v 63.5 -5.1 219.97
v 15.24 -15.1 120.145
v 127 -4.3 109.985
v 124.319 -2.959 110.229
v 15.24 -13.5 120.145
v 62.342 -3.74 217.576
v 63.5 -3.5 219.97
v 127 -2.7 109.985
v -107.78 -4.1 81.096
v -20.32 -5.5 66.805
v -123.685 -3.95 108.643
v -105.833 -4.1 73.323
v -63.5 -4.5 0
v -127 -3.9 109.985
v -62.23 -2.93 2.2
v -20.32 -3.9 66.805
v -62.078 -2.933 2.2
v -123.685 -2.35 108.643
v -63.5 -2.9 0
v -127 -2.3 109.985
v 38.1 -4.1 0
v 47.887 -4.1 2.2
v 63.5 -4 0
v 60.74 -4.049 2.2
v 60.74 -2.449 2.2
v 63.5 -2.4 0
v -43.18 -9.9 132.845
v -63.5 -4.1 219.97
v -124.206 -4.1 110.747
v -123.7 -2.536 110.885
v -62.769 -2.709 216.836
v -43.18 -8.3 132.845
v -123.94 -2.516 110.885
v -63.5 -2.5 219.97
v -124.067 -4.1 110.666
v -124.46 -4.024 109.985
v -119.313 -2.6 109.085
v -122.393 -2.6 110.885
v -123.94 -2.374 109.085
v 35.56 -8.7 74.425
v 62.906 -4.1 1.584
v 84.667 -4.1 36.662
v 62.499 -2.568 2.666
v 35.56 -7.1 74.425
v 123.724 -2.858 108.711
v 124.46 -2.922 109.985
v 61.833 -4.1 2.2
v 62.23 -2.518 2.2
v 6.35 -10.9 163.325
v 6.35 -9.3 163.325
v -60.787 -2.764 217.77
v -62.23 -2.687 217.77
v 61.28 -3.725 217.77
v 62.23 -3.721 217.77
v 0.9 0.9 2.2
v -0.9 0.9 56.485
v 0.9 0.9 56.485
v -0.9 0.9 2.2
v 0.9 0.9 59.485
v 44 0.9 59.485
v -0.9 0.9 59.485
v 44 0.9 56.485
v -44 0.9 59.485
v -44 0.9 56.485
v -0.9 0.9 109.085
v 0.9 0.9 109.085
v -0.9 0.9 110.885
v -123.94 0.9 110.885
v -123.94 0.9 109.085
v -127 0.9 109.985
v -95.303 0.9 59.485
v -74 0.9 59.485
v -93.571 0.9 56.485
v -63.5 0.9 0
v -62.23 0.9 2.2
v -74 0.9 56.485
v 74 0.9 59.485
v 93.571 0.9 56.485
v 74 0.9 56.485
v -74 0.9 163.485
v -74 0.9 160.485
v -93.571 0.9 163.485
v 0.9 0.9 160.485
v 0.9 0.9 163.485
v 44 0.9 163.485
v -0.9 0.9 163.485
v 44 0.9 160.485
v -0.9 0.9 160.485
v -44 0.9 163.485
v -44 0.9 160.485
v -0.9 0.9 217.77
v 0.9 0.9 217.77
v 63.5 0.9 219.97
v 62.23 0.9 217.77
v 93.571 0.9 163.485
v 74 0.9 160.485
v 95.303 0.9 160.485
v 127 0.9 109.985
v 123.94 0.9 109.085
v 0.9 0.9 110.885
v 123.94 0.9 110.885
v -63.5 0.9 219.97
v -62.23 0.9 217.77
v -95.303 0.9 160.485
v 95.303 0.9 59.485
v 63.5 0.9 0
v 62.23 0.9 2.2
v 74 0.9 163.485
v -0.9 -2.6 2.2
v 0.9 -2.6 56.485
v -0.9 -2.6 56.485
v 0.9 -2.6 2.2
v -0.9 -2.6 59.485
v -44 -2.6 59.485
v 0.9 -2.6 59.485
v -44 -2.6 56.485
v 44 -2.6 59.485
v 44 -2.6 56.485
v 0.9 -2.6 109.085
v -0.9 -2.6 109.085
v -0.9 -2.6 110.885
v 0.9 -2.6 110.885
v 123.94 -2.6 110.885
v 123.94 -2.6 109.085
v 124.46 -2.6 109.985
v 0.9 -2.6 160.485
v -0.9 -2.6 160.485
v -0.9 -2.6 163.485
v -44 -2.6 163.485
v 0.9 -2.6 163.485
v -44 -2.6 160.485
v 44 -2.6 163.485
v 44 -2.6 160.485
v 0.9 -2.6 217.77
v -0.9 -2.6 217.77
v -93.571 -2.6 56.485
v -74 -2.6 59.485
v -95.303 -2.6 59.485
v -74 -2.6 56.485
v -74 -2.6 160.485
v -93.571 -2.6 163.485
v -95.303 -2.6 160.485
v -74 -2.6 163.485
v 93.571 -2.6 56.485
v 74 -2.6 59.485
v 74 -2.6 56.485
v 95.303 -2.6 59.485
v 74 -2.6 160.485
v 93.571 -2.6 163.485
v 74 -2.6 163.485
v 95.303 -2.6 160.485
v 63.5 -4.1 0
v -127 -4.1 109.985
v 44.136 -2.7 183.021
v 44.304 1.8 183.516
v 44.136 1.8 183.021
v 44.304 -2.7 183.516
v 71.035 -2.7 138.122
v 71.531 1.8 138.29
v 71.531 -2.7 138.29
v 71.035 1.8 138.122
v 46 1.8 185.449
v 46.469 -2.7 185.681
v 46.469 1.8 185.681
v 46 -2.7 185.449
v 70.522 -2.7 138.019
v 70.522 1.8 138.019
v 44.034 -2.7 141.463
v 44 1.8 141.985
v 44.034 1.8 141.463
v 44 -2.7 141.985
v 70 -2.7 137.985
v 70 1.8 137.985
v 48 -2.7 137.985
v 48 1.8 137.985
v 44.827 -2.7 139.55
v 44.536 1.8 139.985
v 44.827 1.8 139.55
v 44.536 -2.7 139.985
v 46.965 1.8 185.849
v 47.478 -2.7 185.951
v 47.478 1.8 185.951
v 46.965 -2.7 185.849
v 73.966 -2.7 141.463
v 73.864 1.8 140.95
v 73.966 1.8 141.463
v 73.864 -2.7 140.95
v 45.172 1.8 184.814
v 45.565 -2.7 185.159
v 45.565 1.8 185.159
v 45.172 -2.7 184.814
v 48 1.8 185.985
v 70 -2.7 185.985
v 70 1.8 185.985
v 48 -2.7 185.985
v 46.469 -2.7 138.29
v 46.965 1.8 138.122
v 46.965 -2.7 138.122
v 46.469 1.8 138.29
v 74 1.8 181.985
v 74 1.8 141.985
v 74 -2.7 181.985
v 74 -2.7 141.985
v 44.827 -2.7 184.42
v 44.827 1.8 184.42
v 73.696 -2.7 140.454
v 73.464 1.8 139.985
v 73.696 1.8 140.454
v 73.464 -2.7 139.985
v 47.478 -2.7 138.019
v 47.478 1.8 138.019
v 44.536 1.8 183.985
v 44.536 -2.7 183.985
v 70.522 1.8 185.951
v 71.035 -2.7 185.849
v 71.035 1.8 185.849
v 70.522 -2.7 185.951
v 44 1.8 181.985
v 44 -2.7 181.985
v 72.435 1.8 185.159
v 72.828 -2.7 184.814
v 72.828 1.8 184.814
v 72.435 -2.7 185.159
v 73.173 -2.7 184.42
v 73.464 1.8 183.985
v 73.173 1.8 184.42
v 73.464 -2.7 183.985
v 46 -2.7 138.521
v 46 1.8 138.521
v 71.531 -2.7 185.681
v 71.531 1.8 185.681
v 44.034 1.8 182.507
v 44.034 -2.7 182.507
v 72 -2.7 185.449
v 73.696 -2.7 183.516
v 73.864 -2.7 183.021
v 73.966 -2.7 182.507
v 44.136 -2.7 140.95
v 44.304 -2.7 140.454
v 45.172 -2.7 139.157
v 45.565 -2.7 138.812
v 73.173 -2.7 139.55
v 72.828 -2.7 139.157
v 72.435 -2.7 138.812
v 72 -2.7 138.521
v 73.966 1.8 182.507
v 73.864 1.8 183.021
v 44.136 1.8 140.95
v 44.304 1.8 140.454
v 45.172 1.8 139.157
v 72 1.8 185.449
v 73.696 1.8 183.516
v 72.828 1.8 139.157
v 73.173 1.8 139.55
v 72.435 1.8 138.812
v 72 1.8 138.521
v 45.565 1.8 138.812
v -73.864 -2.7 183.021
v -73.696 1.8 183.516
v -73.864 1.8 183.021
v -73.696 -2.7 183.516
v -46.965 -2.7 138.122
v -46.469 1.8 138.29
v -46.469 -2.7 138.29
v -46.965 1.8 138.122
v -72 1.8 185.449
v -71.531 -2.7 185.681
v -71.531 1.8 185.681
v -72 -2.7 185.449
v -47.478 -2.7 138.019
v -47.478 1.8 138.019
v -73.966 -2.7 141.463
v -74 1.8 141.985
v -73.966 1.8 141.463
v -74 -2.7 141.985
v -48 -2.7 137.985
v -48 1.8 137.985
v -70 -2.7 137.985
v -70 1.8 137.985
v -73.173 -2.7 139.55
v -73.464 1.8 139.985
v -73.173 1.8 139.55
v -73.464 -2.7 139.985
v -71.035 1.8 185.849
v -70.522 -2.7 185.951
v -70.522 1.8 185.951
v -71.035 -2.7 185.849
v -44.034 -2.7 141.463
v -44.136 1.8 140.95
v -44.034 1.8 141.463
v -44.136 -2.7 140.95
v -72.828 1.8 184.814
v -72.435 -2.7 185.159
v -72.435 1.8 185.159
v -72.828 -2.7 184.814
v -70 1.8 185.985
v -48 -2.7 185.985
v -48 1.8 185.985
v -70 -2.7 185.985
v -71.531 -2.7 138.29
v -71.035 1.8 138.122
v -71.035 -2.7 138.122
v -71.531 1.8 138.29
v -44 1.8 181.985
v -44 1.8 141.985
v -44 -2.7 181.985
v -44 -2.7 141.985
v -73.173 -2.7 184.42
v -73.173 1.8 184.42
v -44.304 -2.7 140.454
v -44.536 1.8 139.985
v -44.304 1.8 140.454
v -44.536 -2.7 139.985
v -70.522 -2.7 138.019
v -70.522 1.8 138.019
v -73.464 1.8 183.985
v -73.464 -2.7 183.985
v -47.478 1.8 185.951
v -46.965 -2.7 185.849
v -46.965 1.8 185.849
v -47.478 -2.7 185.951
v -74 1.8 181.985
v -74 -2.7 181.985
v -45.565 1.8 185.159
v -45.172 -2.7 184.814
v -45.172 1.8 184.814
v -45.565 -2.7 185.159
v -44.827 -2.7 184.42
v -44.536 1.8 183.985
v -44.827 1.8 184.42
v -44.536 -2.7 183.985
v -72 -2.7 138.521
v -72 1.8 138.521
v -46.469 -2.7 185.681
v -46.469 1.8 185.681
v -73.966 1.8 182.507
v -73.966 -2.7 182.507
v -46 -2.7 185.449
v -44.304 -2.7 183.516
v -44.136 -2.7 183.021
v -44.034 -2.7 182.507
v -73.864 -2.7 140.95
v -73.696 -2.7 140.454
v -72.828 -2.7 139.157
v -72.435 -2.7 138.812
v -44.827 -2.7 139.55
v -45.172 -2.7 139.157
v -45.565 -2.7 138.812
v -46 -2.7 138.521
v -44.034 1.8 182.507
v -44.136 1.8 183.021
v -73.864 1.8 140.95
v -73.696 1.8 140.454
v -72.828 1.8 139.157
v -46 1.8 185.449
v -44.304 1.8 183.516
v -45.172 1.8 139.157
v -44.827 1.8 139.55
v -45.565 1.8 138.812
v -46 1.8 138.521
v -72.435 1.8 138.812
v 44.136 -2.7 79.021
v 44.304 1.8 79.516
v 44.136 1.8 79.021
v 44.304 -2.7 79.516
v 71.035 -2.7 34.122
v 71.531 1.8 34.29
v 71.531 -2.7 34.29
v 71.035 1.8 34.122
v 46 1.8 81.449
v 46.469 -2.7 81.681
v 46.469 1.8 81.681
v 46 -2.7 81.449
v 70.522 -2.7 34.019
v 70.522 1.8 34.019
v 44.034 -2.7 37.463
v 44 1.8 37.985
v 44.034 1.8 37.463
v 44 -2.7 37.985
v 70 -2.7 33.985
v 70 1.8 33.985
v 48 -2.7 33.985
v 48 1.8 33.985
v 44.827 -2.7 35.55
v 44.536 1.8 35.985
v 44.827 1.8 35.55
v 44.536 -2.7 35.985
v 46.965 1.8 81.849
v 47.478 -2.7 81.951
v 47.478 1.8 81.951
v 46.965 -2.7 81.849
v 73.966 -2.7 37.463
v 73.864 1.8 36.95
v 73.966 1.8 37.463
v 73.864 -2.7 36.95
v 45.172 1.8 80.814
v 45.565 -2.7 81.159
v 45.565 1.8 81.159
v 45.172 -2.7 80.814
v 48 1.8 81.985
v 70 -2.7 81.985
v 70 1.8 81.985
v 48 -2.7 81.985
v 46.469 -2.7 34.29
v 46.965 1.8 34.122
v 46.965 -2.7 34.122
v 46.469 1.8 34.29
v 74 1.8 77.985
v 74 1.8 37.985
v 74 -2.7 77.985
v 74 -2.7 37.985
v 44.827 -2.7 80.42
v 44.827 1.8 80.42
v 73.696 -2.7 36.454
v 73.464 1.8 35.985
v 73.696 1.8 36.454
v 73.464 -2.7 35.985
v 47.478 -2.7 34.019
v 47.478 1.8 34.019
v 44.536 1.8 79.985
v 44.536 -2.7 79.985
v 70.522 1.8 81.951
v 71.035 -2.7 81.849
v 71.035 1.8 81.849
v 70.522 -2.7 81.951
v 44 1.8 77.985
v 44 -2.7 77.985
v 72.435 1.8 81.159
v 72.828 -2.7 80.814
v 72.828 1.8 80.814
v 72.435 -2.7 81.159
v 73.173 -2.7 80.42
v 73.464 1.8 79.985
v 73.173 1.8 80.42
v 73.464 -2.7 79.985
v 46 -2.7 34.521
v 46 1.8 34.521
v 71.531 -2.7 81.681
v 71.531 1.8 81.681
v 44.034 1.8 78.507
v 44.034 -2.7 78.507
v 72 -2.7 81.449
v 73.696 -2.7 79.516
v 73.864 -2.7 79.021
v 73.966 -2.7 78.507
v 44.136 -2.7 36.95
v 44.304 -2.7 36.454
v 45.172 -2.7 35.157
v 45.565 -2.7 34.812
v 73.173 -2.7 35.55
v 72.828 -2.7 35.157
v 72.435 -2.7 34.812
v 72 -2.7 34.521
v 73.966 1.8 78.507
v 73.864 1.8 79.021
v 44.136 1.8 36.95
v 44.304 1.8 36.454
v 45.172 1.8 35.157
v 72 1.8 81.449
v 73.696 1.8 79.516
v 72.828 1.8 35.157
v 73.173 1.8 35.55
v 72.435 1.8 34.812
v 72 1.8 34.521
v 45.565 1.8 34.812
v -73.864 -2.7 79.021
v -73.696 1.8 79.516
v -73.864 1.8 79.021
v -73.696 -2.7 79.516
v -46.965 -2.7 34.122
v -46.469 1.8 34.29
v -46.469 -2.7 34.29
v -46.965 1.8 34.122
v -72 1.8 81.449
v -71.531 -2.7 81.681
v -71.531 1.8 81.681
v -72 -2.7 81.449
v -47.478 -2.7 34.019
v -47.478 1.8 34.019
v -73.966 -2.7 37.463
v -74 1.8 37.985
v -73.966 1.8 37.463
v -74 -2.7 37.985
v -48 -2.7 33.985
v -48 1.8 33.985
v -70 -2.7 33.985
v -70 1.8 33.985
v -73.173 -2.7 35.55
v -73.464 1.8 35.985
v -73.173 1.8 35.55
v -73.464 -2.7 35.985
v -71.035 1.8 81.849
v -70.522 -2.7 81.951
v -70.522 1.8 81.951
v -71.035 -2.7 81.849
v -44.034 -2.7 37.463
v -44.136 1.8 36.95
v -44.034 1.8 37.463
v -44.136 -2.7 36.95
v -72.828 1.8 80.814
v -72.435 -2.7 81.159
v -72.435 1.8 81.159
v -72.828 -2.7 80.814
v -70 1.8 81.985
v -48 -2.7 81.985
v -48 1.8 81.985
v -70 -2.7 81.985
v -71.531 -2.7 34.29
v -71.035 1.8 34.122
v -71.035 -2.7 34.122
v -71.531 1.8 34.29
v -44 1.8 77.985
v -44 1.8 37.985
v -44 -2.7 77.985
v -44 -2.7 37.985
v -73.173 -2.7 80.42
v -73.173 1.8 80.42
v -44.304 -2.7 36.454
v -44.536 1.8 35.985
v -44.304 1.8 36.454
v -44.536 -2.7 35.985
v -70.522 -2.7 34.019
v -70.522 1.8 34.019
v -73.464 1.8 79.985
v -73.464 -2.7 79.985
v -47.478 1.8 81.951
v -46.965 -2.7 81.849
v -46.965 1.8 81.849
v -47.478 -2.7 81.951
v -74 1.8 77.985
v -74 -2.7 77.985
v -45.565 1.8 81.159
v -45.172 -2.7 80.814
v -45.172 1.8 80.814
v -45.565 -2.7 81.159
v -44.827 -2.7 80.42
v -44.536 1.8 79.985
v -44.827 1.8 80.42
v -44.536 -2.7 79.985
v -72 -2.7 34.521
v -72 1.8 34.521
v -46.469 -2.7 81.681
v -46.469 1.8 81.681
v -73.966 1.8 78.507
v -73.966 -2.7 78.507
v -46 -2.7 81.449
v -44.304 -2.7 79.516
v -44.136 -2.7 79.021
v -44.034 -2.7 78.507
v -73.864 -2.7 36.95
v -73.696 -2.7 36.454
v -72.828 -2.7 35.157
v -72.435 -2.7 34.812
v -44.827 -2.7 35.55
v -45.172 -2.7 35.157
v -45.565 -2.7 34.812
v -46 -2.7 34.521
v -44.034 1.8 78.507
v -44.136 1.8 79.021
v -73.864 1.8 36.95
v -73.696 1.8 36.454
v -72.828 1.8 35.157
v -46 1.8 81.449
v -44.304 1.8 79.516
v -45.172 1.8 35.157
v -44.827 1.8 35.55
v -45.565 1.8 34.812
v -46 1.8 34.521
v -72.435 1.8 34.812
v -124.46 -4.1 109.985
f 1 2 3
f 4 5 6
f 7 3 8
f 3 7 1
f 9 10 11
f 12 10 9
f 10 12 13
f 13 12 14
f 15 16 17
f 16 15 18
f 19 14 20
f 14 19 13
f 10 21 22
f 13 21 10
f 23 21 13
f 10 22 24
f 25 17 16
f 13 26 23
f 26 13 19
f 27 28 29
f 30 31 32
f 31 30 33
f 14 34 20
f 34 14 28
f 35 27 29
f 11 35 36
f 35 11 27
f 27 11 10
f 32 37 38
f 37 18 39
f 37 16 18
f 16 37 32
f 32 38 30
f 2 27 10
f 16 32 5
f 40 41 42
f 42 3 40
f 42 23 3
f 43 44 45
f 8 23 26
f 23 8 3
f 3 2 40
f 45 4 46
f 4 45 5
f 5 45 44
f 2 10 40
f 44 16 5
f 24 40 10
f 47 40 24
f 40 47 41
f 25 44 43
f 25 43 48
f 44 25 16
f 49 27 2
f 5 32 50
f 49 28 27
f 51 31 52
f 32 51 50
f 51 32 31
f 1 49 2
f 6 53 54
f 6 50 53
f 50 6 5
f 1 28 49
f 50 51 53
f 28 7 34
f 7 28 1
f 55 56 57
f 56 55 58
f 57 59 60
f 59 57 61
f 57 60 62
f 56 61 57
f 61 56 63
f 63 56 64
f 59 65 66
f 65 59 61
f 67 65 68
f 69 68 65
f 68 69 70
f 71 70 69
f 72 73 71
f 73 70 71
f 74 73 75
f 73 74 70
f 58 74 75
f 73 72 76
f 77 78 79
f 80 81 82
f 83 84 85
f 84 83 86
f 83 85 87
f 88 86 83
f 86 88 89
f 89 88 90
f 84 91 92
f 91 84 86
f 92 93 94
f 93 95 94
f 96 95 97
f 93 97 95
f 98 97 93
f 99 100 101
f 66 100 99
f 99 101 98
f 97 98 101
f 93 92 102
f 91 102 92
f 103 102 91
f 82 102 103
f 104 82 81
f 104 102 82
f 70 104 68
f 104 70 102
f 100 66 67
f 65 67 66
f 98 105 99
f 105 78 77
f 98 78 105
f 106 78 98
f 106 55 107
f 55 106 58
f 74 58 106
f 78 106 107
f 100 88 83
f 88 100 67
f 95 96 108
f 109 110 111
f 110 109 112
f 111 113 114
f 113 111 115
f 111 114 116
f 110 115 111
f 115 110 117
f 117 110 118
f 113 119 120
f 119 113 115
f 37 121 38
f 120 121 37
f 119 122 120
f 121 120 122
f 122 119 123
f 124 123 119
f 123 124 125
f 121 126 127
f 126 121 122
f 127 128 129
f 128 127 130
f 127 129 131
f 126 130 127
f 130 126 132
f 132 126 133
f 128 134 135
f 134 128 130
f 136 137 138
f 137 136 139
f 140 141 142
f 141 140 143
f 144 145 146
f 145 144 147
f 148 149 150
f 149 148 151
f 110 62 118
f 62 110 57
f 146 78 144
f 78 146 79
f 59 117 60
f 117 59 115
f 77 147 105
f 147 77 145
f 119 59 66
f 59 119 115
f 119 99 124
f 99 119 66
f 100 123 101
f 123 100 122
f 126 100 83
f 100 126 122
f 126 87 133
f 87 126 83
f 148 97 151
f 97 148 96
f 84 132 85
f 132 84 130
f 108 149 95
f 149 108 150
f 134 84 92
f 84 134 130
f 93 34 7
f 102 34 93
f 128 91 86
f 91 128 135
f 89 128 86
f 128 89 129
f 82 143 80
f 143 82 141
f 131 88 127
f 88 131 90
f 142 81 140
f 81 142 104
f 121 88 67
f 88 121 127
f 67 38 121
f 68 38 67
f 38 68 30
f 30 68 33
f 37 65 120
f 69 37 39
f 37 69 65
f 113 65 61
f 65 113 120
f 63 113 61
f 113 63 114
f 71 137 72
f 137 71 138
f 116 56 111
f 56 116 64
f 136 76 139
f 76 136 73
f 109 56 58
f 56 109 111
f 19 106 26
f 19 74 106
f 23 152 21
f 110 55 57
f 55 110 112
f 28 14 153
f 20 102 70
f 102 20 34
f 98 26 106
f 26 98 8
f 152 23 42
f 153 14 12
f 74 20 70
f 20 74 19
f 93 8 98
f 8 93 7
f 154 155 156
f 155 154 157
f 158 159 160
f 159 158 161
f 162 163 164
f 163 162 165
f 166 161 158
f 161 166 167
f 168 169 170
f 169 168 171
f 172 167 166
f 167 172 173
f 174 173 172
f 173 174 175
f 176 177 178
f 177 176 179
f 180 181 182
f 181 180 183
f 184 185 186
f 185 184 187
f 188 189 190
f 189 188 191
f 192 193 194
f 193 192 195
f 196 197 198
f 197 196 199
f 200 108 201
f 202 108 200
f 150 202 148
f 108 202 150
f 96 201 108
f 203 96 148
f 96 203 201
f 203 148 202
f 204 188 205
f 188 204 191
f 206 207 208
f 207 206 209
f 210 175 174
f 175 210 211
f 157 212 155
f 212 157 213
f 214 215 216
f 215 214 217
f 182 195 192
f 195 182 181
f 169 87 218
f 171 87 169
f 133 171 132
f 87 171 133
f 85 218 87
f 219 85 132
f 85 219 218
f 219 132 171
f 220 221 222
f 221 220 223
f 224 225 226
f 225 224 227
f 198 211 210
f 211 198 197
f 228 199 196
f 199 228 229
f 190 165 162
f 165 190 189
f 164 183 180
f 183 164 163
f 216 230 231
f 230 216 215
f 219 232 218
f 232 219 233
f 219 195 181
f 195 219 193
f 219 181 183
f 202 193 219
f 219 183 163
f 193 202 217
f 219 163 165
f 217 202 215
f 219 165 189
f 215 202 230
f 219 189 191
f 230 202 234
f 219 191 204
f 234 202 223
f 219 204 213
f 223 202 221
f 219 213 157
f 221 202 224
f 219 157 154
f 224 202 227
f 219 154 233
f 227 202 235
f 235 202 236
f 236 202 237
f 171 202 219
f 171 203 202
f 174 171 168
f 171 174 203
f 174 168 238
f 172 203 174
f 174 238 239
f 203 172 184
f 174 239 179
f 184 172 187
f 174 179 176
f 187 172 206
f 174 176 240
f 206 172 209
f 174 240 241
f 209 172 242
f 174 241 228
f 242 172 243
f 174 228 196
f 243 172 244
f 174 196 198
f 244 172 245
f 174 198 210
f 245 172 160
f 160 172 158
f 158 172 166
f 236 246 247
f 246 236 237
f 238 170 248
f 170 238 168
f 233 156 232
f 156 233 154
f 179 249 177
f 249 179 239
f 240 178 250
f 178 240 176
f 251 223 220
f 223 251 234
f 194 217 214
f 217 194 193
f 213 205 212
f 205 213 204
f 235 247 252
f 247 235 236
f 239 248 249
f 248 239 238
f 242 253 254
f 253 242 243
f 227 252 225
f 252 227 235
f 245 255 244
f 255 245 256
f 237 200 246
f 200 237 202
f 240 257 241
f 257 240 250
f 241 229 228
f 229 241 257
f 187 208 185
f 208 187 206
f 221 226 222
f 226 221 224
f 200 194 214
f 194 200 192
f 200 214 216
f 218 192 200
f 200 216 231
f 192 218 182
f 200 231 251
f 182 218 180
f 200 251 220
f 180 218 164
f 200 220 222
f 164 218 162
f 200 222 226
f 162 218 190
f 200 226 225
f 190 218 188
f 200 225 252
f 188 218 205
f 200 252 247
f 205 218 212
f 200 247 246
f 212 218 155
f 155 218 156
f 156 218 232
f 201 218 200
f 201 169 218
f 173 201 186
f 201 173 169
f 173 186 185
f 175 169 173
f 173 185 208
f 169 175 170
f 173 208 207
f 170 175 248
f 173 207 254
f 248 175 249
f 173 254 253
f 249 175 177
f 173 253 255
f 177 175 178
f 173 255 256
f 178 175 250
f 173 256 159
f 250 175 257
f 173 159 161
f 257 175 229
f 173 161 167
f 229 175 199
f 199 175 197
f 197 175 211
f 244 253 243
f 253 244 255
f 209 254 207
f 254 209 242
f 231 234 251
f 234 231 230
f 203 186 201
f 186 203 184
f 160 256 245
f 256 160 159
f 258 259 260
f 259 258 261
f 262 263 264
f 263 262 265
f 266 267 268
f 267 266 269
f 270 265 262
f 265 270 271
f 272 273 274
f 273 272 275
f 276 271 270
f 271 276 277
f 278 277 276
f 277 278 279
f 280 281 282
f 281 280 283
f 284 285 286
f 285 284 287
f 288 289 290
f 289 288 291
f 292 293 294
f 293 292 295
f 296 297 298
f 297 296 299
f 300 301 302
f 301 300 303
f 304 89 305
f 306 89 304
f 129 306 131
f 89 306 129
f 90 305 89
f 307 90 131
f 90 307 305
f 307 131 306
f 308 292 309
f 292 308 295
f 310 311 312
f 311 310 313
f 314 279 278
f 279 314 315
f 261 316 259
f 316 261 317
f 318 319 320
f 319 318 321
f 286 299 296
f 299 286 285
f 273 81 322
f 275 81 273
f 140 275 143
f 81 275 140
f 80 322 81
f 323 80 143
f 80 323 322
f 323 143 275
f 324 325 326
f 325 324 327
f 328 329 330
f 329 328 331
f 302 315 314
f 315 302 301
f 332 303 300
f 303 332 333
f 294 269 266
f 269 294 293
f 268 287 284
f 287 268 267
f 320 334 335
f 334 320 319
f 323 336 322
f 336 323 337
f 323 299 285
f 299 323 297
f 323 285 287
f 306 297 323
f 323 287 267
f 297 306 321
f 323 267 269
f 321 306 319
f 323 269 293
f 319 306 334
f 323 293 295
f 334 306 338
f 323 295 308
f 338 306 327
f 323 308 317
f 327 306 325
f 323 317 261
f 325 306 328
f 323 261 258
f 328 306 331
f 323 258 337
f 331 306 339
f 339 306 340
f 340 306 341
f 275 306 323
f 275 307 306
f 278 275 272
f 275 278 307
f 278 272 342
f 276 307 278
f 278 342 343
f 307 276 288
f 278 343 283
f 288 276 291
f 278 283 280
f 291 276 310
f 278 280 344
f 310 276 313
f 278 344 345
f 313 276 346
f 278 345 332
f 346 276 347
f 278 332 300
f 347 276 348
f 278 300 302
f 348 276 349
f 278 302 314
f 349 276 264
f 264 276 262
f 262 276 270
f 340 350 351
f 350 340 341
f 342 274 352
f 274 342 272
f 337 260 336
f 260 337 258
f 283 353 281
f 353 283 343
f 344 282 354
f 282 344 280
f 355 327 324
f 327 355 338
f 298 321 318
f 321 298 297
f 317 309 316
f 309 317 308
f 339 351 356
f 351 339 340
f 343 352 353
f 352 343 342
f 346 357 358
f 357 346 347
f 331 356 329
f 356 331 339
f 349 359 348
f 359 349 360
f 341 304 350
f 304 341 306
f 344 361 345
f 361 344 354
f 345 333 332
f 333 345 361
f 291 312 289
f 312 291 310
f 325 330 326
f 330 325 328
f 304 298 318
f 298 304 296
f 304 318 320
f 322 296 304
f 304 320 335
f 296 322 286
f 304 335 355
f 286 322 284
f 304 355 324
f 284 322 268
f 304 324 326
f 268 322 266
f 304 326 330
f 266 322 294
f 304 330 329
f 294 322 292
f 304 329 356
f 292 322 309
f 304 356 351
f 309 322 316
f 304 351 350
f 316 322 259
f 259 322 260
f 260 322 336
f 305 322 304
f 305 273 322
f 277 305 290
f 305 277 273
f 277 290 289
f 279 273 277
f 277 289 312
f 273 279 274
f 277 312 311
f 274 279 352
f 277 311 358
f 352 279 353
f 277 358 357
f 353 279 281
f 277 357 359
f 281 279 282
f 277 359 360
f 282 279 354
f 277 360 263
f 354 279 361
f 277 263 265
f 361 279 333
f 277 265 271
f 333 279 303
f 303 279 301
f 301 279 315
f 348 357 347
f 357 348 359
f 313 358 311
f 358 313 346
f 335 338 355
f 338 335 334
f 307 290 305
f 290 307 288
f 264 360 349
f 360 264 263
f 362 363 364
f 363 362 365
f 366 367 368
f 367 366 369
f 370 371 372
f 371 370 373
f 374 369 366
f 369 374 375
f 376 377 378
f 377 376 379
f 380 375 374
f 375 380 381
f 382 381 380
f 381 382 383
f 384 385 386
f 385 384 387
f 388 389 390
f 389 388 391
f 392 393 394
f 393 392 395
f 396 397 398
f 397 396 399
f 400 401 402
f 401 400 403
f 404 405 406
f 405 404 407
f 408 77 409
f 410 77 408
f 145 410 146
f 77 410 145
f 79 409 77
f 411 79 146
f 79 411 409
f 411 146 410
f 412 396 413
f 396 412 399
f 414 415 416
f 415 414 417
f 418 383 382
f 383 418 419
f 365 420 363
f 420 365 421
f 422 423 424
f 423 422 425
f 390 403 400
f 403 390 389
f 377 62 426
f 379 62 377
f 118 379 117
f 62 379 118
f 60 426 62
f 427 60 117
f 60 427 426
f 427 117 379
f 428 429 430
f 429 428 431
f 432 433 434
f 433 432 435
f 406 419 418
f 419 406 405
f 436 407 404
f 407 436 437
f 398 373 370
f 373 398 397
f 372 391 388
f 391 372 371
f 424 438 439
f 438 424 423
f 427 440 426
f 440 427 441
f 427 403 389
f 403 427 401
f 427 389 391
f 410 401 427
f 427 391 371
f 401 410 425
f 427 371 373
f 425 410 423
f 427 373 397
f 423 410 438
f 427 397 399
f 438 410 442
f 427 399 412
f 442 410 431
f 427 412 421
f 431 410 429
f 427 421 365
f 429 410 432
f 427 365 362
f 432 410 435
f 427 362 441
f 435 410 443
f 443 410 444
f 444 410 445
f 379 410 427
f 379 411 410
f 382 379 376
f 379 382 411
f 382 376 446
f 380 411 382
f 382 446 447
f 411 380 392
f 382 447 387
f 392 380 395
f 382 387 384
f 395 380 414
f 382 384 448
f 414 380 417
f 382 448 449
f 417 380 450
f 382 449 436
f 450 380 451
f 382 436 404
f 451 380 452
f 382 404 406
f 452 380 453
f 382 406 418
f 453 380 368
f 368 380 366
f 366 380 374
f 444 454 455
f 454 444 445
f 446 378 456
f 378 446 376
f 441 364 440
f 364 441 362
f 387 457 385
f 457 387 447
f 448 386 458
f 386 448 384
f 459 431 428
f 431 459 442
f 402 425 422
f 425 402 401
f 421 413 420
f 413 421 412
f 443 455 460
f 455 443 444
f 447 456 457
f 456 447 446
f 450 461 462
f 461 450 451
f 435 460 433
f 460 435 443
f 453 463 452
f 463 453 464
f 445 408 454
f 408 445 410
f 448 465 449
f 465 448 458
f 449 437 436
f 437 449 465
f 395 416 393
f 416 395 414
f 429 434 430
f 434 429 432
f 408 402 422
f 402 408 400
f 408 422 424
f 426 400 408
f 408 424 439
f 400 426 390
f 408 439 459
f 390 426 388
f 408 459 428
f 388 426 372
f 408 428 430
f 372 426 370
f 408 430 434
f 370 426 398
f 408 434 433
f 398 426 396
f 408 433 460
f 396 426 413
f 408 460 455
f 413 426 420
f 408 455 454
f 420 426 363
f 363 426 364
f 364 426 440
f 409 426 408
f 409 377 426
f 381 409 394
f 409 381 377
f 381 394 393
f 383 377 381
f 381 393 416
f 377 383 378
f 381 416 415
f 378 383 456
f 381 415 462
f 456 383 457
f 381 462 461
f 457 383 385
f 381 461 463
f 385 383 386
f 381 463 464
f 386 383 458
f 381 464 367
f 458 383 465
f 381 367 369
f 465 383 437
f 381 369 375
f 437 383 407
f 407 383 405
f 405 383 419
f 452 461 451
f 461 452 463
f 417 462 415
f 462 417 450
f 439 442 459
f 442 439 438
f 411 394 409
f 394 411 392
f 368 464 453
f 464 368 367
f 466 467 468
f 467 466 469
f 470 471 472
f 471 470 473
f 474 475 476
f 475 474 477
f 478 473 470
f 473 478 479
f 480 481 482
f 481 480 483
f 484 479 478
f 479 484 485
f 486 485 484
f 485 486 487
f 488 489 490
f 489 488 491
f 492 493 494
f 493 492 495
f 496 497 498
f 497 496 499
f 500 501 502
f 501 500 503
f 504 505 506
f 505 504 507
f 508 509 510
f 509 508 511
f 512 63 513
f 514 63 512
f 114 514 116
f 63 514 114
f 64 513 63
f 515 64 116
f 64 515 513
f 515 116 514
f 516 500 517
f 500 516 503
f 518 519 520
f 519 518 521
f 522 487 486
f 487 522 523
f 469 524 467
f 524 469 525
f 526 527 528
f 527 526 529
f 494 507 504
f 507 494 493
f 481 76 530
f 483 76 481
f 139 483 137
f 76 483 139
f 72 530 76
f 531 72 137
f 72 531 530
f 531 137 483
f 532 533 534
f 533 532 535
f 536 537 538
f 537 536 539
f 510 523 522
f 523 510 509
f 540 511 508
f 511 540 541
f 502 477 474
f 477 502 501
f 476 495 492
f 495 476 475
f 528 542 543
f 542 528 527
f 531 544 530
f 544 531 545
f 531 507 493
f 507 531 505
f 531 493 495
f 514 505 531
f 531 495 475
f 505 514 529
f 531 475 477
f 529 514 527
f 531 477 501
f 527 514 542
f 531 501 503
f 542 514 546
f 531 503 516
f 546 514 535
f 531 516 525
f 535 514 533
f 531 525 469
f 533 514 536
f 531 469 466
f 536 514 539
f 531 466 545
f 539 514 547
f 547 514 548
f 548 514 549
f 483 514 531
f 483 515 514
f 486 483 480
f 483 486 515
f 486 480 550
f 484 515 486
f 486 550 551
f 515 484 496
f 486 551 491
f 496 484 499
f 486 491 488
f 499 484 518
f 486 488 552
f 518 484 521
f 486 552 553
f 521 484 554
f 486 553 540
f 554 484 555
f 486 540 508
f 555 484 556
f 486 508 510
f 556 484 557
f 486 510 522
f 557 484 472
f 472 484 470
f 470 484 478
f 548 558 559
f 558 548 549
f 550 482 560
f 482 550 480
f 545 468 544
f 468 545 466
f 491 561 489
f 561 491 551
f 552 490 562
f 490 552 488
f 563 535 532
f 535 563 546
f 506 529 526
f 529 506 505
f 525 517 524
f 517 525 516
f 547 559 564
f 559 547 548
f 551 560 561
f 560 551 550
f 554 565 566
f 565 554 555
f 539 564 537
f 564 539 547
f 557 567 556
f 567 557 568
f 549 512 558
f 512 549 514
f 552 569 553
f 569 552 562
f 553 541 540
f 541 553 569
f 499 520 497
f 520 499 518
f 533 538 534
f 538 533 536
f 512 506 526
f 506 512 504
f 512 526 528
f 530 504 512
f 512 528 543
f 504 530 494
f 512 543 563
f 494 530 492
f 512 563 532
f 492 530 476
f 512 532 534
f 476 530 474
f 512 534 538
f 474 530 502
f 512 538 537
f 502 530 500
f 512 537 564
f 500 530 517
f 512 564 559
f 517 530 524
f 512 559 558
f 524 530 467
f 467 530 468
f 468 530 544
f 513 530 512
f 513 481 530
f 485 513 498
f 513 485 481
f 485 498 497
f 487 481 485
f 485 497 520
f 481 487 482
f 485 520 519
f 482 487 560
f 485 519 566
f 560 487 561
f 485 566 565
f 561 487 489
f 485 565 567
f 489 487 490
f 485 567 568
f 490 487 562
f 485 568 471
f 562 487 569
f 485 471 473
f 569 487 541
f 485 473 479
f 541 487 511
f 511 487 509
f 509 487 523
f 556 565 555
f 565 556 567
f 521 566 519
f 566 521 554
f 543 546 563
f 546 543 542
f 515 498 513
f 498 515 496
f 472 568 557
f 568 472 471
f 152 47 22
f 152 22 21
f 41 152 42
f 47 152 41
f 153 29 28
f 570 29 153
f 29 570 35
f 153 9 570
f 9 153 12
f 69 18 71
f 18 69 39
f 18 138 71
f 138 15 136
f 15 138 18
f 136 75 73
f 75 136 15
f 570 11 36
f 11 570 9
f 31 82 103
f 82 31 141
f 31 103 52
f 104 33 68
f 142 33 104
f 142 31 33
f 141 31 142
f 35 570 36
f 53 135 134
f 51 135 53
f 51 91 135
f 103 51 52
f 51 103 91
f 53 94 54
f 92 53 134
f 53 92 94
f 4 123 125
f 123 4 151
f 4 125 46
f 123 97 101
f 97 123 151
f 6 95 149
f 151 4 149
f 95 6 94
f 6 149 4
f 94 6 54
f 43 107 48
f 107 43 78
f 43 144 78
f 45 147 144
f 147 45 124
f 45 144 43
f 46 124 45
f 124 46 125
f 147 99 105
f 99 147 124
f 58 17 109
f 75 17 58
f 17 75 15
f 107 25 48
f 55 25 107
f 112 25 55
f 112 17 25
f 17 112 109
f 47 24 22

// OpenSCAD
/*
  Parametric Faceted Hex Wall Tile v16
  -----------------------------------
  Goals:
    - 10 in point-to-point regular hex by default
    - stronger asymmetric low-poly relief
    - open-back shell for lower weight / faster printing
    - four hidden shallow adhesive mounting pads
    - no perimeter tabs or ears
    - vertical export orientation with a full flat edge on the bed
    - mount load rails separated from general stiffening ribs

  Units: millimeters
*/

$fn = 48;

// ============================================================
// A) GLOBAL QUALITY / EXPORT
// ============================================================
render_orientation  = "vertical"; // "flat" or "vertical"

// ============================================================
// B) TILE SIZE
// ============================================================
point_to_point      = 254.0;   // 10.000 in; left vertex to right vertex

// ============================================================
// C) FACE / RELIEF
// ============================================================
roof_skin           = 1.60;    // vertical skin thickness
edge_relief         = 4.80;    // nominal relief at outer perimeter
peak_relief         = 16.00;   // dominant asymmetric peak
secondary_relief    = 10.80;
low_relief          = 6.40;

// Fine-tune the six outer corners clockwise from rightmost.
corner_z = [
    edge_relief + 0.4,  // right
    edge_relief + 1.2,  // upper-right
    edge_relief + 0.2,  // upper-left
    edge_relief + 0.0,  // left
    edge_relief + 0.6,  // lower-left
    edge_relief + 0.1   // lower-right
];

// ============================================================
// D) SHELL
// ============================================================
perimeter_wall      = 2.20;    // wall thickness measured inward
wall_height         = 5.00;    // ensures positive overlap with roof underside

// ============================================================
// E) STRUCTURAL RIBS
// ============================================================
add_cross_ribs      = true;
add_mount_rails     = true;
cross_rib_width     = 1.80;    // general anti-twist ribs
mount_rail_width    = 3.00;    // wider rails carry adhesive-pad loads
rib_height          = 3.50;

// ============================================================
// F) HIDDEN ADHESIVE MOUNTS
// ============================================================
mounts_enabled      = true;
mount_pad_width     = 30.0;
mount_pad_height    = 48.0;
mount_pad_radius    = 4.0;
mount_pad_proud     = 0.90;    // how far pad face sits behind rear plane
mount_core_height   = 3.60;    // core overlaps the structural rails for a positive union
mount_x_offset      = 59.0;
mount_y_offset      = 52.0;

// ============================================================
// G) NUMERICAL / BOOLEAN TOLERANCES
// ============================================================
eps                 = 0.02;

// ============================================================
// H) ADVANCED FACET LAYOUT / DERIVED DIMENSIONS
// ============================================================
R = point_to_point / 2;
H = R * sqrt(3) / 2;
flat_to_flat = 2 * H;

// Normalized XY point set. 0..5 are the regular-hex perimeter.
// 6..10 are deliberately asymmetric interior control points.
xy_norm = [
    [ 1.00,  0.00],
    [ 0.50,  0.8660254038],
    [-0.50,  0.8660254038],
    [-1.00,  0.00],
    [-0.50, -0.8660254038],
    [ 0.50, -0.8660254038],
    [ 0.12,  0.08],   // dominant peak control
    [-0.34,  0.18],   // left shoulder
    [ 0.28, -0.28],   // lower-right ridge
    [-0.16, -0.34],   // lower basin/transition
    [ 0.05,  0.42]    // upper secondary ridge
];

// Delaunay-style triangulation over the six perimeter and five interior points.
triangles = [
    [1,6,0],
    [4,9,3],
    [5,9,4],
    [7,2,3],
    [9,7,3],
    [7,9,6],
    [8,5,0],
    [6,8,0],
    [9,8,6],
    [5,8,9],
    [10,7,6],
    [7,10,2],
    [1,10,6],
    [2,10,1]
];

// Relief values for all 11 points.
// Interior values are intentionally non-radial to avoid a centered "tent" look.
z_values = [
    corner_z[0],
    corner_z[1],
    corner_z[2],
    corner_z[3],
    corner_z[4],
    corner_z[5],
    peak_relief,              // 6 - dominant peak, slightly right/below center
    secondary_relief,         // 7 - left shoulder
    secondary_relief - 1.2,   // 8 - lower-right ridge
    low_relief,               // 9 - lower transition
    secondary_relief + 1.0    // 10 - upper ridge
];

function pxy(i) = [xy_norm[i][0] * R, xy_norm[i][1] * R];
function p3(i, dz=0) = [pxy(i)[0], pxy(i)[1], z_values[i] + dz];

module hex2d(inset=0) {
    if (inset == 0)
        polygon(points=[for (i=[0:5]) pxy(i)]);
    else
        offset(delta=-inset)
            polygon(points=[for (i=[0:5]) pxy(i)]);
}

module rounded_rect_2d(w, h, r) {
    // offset/square construction stays stable for parameter changes.
    offset(r=r)
        square([max(eps, w-2*r), max(eps, h-2*r)], center=true);
}

module facet_wedge(a, b, c) {
    // A thin, vertically offset triangular roof panel.
    // Unioning all wedges gives a continuous faceted skin.
    pts = [
        p3(a), p3(b), p3(c),
        p3(a, -roof_skin), p3(b, -roof_skin), p3(c, -roof_skin)
    ];

    polyhedron(
        points=pts,
        faces=[
            [0,1,2],      // top
            [5,4,3],      // underside
            [0,3,4,1],
            [1,4,5,2],
            [2,5,3,0]
        ],
        convexity=8
    );
}

module roof_skin_mesh() {
    union() {
        for (t = triangles)
            facet_wedge(t[0], t[1], t[2]);
    }
}

module perimeter_ring() {
    linear_extrude(height=wall_height)
        difference() {
            hex2d();
            hex2d(perimeter_wall);
        }
}

module rear_mount(x, y) {
    // Rear adhesive face is only mount_pad_proud behind the global rear plane.
    // Pads intersect the structural mounting rails.
    // Rails distribute mounting load into the perimeter shell.
    translate([x, y, -mount_pad_proud])
        linear_extrude(height=mount_core_height + mount_pad_proud)
            rounded_rect_2d(mount_pad_width, mount_pad_height, mount_pad_radius);
}

module structural_ribs() {
    // General ribs stabilize the open shell; wider mount rails tie the
    // adhesive pads mechanically into the perimeter.
    if (add_cross_ribs || add_mount_rails) {
        intersection() {
            linear_extrude(height=rib_height)
                union() {
                    if (add_cross_ribs) {
                        square([point_to_point, cross_rib_width], center=true);
                        square([cross_rib_width, flat_to_flat], center=true);
                    }

                    if (add_mount_rails) {
                        // These rails pass directly through the four pad centers
                        // and reach the perimeter ring at both ends.
                        translate([0, mount_y_offset])
                            square([point_to_point, mount_rail_width], center=true);
                        translate([0, -mount_y_offset])
                            square([point_to_point, mount_rail_width], center=true);
                    }
                }
            linear_extrude(height=rib_height)
                hex2d();
        }
    }
}

module tile_flat() {
    union() {
        roof_skin_mesh();
        perimeter_ring();
        structural_ribs();

        if (mounts_enabled) {
            rear_mount( mount_x_offset,  mount_y_offset);
            rear_mount(-mount_x_offset,  mount_y_offset);
            rear_mount( mount_x_offset, -mount_y_offset);
            rear_mount(-mount_x_offset, -mount_y_offset);
        }
    }
}

module final_model() {
    if (render_orientation == "vertical") {
        // Rotate so the original lower flat of the hex becomes the print-bed edge.
        // Move rear-most adhesive faces up to Y=0 for predictable slicer placement.
        translate([0, mount_pad_proud, H])
            rotate([90,0,0])
                tile_flat();
    } else {
        tile_flat();
    }
}

final_model();

// Expected default overall flat dimensions:
// point-to-point = 254.00 mm (10.000 in)
// flat-to-flat   = ~219.97 mm (8.660 in)
